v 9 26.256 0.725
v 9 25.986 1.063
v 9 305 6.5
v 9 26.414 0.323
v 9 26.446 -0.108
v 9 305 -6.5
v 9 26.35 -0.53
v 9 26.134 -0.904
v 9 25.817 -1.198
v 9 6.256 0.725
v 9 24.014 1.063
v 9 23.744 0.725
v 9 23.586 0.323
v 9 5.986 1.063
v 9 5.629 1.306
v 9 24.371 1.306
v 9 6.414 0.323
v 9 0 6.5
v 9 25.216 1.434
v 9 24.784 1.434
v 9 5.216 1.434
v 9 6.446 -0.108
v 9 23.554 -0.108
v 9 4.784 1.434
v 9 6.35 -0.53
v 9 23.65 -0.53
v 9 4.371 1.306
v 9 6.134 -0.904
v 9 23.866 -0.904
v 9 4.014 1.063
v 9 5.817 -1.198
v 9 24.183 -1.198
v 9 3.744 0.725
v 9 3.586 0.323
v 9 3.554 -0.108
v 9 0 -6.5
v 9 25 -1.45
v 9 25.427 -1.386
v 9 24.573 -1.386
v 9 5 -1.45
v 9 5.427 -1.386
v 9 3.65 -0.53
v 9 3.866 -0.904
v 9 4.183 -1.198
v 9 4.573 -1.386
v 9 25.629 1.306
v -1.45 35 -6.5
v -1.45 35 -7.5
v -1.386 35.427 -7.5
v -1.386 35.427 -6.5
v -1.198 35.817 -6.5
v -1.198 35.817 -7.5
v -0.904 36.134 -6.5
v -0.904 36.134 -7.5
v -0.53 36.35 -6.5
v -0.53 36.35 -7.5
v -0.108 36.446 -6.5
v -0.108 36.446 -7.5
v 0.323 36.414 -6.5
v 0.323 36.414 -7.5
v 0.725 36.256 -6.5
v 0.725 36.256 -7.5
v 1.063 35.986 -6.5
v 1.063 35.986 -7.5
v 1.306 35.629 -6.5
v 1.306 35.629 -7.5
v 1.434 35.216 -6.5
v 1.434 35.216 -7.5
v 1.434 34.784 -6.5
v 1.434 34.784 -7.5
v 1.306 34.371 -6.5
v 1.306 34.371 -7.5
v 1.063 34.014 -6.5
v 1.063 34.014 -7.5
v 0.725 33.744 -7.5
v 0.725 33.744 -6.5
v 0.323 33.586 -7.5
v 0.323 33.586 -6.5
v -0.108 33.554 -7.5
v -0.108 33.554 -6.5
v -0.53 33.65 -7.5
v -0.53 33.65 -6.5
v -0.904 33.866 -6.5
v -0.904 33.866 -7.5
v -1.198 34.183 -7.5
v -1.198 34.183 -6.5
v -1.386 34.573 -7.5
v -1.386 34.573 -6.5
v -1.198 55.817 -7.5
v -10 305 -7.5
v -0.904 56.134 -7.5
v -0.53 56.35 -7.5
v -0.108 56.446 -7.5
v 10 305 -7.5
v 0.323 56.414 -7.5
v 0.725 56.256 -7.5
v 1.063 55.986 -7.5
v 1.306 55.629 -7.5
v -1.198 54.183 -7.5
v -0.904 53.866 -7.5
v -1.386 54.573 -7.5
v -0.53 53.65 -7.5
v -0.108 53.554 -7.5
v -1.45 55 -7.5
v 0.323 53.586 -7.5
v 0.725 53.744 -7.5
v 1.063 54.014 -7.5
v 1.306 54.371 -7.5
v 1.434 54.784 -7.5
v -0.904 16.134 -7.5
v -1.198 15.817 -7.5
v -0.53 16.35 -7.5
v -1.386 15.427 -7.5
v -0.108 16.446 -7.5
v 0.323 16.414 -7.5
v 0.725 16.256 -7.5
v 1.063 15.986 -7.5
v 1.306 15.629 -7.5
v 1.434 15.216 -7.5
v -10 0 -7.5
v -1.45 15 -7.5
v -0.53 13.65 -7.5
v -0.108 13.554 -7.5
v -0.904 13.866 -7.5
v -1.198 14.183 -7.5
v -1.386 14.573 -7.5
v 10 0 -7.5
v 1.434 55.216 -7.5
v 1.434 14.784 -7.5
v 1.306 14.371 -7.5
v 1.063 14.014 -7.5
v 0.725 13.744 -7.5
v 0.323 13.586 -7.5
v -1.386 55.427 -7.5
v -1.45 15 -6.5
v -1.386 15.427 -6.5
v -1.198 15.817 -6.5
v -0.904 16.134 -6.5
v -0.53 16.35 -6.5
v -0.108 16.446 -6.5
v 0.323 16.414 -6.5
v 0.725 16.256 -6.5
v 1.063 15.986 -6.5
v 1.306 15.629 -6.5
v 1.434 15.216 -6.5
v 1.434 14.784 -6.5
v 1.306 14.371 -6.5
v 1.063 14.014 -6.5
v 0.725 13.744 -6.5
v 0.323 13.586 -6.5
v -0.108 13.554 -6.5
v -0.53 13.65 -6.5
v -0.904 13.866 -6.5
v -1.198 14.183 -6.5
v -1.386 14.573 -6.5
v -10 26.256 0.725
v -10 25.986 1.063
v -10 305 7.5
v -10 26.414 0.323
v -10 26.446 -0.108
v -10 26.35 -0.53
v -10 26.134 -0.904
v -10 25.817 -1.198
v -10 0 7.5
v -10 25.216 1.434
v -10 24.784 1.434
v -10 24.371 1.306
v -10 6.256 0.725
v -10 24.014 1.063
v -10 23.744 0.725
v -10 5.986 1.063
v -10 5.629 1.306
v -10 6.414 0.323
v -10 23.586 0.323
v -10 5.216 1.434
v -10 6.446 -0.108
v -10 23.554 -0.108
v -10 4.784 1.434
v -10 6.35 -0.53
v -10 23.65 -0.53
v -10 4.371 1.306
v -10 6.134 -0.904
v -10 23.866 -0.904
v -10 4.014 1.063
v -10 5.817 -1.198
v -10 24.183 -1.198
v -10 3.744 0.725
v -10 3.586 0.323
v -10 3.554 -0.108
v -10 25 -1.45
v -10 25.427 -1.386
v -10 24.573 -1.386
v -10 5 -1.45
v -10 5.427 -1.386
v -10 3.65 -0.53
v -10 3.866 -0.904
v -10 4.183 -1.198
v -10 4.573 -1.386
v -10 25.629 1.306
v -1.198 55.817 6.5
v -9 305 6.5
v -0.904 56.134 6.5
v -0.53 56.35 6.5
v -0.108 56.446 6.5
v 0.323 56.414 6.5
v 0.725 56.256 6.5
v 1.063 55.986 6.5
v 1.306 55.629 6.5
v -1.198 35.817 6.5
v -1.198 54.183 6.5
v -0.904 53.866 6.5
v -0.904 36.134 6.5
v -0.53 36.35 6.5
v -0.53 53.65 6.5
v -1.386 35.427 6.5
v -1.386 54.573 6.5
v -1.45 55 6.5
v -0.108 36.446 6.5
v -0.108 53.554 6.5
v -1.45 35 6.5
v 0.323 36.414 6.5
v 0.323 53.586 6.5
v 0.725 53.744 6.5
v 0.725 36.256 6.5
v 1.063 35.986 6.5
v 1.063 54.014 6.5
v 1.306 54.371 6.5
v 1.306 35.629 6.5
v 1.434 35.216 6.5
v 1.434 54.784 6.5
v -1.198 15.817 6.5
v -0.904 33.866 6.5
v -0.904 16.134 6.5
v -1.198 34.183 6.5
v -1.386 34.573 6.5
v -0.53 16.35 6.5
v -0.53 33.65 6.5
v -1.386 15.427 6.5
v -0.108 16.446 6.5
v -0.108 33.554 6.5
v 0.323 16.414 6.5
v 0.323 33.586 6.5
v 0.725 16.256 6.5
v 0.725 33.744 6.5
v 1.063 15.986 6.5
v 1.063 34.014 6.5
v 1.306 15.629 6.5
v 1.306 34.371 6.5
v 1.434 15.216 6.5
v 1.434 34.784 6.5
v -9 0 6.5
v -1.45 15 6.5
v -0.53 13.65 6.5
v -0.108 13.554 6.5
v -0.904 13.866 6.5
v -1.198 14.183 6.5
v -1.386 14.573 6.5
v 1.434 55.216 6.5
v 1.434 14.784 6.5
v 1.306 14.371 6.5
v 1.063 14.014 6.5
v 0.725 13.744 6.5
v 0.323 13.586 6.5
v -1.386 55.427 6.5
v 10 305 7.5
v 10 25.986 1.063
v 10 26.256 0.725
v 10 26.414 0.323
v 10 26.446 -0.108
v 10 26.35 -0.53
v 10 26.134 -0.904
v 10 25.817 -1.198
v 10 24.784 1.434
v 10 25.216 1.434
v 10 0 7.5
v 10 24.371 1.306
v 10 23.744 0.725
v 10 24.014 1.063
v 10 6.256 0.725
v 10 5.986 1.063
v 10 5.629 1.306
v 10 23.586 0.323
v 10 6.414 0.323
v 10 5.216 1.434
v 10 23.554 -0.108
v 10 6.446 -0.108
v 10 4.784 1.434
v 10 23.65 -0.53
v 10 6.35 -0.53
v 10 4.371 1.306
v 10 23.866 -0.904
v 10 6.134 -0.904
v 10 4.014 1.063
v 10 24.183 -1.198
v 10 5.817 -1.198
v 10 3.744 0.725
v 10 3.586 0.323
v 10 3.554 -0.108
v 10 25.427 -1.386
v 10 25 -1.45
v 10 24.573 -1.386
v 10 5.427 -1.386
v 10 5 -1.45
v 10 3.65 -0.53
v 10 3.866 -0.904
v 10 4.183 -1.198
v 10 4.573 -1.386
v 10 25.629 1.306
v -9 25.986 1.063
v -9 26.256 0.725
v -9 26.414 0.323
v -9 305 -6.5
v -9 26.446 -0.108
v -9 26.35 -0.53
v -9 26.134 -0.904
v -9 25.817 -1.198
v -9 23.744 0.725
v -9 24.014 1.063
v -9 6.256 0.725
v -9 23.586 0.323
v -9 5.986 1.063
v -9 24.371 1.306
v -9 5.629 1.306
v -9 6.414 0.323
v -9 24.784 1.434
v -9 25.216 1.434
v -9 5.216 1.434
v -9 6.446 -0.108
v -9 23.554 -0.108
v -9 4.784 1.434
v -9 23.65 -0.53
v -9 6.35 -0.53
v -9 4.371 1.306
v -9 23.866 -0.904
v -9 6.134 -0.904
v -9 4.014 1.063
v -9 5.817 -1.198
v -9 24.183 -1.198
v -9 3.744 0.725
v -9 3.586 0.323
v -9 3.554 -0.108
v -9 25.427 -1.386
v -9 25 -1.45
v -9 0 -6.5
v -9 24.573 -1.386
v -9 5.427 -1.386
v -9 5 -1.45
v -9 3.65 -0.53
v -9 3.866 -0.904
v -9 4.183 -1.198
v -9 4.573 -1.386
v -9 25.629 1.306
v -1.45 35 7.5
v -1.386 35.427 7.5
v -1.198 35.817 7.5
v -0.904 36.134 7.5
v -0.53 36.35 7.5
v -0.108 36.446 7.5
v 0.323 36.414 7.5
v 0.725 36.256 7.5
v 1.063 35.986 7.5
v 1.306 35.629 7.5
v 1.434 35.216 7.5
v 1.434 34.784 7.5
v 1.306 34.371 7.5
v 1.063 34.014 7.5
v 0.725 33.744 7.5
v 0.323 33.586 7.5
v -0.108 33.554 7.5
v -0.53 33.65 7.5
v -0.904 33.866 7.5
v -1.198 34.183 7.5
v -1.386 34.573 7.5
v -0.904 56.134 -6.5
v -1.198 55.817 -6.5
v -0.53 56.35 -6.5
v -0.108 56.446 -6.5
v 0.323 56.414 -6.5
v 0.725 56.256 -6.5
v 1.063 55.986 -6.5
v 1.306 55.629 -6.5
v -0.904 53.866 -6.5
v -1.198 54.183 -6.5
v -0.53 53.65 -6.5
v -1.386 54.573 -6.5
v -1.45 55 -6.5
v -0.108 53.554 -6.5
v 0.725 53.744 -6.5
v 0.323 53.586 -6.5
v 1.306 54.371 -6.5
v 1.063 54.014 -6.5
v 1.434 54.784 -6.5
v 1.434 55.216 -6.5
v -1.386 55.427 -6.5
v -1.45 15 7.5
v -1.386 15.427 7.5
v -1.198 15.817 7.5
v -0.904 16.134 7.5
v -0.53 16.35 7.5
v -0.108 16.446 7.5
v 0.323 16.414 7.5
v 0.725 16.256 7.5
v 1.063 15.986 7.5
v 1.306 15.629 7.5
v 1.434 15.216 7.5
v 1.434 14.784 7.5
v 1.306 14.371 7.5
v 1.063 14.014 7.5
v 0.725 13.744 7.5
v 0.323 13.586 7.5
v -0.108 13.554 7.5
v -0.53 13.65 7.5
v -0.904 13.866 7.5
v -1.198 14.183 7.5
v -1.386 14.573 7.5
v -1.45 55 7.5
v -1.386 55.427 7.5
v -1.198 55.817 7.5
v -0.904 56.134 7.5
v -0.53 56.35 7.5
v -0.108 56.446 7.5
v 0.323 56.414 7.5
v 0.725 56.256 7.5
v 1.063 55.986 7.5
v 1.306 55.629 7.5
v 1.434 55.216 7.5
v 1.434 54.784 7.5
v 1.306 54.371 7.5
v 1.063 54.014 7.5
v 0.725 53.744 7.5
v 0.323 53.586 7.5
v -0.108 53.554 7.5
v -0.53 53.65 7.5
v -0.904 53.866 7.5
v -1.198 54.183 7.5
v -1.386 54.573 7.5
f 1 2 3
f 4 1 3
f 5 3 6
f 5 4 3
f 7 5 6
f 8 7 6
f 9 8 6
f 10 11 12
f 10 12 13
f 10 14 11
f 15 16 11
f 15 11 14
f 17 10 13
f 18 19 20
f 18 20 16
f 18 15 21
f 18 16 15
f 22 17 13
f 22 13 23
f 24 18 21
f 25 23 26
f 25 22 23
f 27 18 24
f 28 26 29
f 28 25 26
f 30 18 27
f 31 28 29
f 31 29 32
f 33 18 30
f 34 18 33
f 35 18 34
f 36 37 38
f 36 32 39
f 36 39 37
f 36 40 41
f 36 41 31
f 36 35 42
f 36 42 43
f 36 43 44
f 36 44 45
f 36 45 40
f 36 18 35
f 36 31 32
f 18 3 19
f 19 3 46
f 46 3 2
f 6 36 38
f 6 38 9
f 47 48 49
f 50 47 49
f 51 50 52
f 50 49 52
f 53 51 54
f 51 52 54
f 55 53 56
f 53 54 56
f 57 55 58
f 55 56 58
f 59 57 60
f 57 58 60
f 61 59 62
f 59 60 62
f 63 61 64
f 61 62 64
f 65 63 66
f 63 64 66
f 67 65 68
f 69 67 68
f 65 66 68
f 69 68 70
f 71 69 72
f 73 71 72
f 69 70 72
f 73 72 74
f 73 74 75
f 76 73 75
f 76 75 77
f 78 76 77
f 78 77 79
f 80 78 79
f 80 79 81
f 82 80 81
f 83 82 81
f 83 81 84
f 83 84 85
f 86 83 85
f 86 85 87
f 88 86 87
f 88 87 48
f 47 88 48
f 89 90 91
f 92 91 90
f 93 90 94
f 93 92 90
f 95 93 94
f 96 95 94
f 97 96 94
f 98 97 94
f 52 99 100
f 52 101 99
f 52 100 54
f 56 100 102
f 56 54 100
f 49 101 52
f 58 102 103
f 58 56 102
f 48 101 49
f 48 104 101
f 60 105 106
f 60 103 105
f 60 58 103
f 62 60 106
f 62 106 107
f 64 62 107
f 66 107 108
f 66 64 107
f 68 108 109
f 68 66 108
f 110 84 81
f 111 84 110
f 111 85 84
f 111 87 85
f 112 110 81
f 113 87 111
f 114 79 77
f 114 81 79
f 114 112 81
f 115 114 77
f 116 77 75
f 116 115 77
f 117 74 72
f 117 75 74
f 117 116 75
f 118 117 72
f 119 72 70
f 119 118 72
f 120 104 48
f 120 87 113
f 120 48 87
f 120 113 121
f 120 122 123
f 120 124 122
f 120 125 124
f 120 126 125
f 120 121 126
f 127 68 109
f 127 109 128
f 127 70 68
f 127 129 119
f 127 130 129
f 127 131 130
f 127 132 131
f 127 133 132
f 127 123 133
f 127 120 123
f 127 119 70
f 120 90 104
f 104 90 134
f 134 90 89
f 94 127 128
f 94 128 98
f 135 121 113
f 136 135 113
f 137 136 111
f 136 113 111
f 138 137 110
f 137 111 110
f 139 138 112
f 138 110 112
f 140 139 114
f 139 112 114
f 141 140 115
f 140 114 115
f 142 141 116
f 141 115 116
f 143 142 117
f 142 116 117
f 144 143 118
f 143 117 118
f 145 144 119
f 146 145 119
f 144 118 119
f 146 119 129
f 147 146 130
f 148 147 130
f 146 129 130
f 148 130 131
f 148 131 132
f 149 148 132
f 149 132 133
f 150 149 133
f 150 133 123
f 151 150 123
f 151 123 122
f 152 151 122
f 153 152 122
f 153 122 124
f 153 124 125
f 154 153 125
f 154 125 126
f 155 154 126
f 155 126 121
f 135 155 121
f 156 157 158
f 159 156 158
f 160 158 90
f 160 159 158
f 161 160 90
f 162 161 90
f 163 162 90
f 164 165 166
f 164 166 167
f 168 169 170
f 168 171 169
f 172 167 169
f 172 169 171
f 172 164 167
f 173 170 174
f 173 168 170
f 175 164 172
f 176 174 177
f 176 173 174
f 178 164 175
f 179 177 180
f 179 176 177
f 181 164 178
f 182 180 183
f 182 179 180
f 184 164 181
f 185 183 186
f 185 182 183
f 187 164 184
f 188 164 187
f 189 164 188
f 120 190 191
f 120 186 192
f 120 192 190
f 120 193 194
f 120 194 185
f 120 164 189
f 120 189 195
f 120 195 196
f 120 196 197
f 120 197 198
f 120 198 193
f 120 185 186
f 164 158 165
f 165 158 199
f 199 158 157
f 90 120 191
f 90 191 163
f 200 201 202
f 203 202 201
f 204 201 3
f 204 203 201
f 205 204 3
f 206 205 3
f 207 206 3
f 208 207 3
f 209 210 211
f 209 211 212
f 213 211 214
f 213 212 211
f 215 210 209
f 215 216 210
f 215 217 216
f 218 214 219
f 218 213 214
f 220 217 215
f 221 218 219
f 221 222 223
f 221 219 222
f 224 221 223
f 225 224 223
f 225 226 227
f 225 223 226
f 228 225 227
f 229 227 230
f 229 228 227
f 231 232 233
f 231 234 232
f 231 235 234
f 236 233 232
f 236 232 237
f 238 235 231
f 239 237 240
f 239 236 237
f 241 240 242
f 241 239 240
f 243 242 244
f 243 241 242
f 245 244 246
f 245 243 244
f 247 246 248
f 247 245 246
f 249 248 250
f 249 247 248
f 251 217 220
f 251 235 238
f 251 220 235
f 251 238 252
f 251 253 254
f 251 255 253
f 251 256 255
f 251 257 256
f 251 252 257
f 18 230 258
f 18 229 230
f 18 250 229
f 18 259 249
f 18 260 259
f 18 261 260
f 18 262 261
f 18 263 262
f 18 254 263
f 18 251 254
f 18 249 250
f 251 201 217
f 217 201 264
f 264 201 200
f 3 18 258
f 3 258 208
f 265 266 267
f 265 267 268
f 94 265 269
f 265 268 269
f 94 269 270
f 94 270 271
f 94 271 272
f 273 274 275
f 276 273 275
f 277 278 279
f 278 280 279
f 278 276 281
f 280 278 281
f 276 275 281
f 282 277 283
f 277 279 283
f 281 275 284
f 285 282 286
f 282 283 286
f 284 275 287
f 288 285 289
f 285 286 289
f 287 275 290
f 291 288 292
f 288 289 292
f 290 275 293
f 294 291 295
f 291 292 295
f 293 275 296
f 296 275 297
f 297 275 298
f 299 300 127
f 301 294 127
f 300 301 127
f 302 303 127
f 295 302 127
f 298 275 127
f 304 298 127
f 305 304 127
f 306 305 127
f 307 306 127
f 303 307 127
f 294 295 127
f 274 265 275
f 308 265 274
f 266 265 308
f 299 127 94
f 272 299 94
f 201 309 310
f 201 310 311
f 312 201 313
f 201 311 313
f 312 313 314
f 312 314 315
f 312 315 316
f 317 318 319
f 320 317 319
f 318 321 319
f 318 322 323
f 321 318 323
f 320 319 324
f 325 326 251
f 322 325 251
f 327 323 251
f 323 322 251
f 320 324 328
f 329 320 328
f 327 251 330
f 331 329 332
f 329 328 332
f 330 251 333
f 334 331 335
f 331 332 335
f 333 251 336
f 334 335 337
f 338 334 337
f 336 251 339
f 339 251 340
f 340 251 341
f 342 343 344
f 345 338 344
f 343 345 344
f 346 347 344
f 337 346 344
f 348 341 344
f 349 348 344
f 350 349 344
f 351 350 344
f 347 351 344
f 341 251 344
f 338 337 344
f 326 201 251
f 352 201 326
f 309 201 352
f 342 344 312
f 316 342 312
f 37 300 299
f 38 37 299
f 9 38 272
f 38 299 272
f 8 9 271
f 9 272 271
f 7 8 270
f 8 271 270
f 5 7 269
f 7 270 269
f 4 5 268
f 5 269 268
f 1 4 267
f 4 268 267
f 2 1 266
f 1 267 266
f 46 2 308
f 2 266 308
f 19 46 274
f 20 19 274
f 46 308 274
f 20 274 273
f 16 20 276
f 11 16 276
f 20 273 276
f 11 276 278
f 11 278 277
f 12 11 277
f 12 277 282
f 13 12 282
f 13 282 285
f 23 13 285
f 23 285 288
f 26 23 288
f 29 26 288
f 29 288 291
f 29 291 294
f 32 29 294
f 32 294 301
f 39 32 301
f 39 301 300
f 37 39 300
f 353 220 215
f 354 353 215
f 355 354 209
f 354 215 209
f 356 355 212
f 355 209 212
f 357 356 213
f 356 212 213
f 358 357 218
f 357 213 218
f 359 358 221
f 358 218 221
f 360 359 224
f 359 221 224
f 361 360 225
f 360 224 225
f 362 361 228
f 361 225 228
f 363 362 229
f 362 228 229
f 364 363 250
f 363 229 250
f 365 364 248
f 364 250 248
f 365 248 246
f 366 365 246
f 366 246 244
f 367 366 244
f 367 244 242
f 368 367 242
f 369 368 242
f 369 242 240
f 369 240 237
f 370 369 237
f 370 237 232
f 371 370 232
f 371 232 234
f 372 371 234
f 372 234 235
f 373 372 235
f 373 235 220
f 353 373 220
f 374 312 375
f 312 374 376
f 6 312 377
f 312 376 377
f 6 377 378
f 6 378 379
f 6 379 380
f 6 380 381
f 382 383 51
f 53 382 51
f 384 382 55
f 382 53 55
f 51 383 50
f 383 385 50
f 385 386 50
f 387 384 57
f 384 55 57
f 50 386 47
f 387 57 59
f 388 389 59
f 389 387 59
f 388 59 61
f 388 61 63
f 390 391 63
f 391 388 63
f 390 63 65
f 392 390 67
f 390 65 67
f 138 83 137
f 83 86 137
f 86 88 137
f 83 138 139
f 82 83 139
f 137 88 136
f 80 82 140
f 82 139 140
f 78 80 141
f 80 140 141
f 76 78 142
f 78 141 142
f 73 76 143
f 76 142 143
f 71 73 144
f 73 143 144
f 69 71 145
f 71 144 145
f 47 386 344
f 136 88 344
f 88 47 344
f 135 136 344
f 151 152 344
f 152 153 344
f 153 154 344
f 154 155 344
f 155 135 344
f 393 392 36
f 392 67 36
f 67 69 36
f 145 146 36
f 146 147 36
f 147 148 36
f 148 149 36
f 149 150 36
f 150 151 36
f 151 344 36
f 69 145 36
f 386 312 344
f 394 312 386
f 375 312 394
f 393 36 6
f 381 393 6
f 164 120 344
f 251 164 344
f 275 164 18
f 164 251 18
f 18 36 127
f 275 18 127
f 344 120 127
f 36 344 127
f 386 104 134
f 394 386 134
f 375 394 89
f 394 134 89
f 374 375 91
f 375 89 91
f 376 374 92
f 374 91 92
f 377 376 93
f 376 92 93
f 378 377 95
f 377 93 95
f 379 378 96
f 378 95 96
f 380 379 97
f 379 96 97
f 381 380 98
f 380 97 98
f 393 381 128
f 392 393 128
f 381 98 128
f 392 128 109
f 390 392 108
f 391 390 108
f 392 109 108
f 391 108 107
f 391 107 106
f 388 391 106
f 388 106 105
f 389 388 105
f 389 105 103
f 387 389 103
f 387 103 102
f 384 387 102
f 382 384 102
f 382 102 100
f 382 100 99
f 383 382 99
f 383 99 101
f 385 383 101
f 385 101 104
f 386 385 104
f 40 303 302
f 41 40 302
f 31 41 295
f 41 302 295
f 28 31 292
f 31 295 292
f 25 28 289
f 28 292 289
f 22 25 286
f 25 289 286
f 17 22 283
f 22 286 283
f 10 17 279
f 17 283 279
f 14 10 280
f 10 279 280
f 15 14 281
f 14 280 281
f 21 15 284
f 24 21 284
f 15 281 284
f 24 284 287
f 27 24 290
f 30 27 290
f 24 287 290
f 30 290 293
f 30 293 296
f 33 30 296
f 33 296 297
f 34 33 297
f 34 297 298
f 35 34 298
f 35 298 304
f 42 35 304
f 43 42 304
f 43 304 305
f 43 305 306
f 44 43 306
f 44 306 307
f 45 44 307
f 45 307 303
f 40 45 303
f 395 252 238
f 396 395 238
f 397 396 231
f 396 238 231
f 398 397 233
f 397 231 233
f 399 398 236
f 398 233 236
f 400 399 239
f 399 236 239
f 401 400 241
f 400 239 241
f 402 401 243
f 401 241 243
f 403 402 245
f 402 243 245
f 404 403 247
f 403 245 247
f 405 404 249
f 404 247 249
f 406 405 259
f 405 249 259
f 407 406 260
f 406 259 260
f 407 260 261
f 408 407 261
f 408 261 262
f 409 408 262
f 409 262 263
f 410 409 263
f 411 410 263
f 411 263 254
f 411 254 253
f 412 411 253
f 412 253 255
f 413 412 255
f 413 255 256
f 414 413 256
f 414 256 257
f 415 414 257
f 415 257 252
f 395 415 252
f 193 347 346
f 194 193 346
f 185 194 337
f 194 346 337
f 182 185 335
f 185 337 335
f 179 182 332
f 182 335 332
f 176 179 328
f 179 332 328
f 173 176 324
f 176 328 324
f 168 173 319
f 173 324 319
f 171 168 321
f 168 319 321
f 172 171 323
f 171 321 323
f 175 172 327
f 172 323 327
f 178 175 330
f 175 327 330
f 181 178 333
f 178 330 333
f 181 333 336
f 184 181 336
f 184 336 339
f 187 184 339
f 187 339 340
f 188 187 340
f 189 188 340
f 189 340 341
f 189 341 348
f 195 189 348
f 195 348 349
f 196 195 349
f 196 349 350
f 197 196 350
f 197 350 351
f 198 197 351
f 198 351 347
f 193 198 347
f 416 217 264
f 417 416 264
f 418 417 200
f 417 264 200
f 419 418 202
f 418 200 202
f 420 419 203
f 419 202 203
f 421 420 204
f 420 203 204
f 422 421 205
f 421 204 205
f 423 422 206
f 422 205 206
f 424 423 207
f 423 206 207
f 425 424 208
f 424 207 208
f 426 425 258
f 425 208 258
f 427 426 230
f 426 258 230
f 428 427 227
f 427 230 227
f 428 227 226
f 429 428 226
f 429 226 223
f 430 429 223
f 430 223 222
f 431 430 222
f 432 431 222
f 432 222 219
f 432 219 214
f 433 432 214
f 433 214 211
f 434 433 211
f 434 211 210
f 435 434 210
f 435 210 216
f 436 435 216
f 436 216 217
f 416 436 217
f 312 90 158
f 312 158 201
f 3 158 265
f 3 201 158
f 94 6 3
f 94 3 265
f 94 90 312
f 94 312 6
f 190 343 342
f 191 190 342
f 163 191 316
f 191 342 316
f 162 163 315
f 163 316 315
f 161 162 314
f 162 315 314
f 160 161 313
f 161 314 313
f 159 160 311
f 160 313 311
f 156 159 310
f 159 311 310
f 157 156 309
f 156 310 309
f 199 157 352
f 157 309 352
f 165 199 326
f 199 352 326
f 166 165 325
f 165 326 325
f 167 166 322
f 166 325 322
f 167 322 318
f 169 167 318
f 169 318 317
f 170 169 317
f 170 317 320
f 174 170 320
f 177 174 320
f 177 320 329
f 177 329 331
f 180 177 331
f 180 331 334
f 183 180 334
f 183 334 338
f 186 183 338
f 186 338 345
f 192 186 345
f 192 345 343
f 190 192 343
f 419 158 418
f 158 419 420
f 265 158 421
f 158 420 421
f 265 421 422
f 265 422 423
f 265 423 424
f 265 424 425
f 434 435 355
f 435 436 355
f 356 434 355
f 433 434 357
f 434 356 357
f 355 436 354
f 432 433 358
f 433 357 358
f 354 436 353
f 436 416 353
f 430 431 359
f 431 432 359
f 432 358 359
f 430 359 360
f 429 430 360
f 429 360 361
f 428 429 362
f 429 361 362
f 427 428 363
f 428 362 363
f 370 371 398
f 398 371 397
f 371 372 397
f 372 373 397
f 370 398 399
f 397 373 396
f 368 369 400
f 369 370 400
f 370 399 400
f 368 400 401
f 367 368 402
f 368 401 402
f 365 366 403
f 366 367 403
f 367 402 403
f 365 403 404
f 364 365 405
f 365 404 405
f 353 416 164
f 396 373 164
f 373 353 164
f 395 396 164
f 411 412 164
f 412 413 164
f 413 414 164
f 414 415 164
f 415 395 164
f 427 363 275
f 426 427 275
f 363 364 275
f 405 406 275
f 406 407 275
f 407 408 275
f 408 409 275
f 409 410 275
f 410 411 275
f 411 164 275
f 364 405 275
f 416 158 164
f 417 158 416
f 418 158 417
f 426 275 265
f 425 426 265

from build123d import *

# Parameters (mm, degrees)
SKETCH_1_W          = 20
SKETCH_1_H          = 15
SKETCH_1_W_2        = 18
SKETCH_1_H_2        = 13
EXTRUDE_1_DEPTH     = 305
SKETCH_2_R          = 1.45
CUT_EXTRUDE_1_DEPTH = 306.747035963
SKETCH_3_R          = 1.45
CUT_EXTRUDE_2_DEPTH = 306.532322349


with BuildPart() as part:
    # 草图1 → 拉伸-薄壁1 (new body)
    with BuildSketch(Plane(origin=(0, 0, 0), x_dir=(1, 0, 0), z_dir=(0, 1, 0))):
        Rectangle(SKETCH_1_W, SKETCH_1_H)
        Rectangle(SKETCH_1_W_2, SKETCH_1_H_2, mode=Mode.SUBTRACT)
    extrude(amount=EXTRUDE_1_DEPTH)

    # 草图2 → 切除-拉伸1 (cut, through all)
    with BuildSketch(Plane(origin=(10, 0, 0), x_dir=(0, 0, -1), z_dir=(1, 0, 0))):
        with Locations((0, 5)):
            Circle(SKETCH_2_R)
        with Locations((0, 25)):
            Circle(SKETCH_2_R)
    extrude(amount=-CUT_EXTRUDE_1_DEPTH, mode=Mode.SUBTRACT)

    # 草图3 → 切除-拉伸2 (cut, through all)
    with BuildSketch(Plane(origin=(0, 0, -7.5), x_dir=(-1, 0, 0), z_dir=(0, 0, -1))):
        with Locations((0, 15)):
            Circle(SKETCH_3_R)
        with Locations((0, 35)):
            Circle(SKETCH_3_R)
        with Locations((0, 55)):
            Circle(SKETCH_3_R)
    extrude(amount=-CUT_EXTRUDE_2_DEPTH, mode=Mode.SUBTRACT)


solid = part.part
